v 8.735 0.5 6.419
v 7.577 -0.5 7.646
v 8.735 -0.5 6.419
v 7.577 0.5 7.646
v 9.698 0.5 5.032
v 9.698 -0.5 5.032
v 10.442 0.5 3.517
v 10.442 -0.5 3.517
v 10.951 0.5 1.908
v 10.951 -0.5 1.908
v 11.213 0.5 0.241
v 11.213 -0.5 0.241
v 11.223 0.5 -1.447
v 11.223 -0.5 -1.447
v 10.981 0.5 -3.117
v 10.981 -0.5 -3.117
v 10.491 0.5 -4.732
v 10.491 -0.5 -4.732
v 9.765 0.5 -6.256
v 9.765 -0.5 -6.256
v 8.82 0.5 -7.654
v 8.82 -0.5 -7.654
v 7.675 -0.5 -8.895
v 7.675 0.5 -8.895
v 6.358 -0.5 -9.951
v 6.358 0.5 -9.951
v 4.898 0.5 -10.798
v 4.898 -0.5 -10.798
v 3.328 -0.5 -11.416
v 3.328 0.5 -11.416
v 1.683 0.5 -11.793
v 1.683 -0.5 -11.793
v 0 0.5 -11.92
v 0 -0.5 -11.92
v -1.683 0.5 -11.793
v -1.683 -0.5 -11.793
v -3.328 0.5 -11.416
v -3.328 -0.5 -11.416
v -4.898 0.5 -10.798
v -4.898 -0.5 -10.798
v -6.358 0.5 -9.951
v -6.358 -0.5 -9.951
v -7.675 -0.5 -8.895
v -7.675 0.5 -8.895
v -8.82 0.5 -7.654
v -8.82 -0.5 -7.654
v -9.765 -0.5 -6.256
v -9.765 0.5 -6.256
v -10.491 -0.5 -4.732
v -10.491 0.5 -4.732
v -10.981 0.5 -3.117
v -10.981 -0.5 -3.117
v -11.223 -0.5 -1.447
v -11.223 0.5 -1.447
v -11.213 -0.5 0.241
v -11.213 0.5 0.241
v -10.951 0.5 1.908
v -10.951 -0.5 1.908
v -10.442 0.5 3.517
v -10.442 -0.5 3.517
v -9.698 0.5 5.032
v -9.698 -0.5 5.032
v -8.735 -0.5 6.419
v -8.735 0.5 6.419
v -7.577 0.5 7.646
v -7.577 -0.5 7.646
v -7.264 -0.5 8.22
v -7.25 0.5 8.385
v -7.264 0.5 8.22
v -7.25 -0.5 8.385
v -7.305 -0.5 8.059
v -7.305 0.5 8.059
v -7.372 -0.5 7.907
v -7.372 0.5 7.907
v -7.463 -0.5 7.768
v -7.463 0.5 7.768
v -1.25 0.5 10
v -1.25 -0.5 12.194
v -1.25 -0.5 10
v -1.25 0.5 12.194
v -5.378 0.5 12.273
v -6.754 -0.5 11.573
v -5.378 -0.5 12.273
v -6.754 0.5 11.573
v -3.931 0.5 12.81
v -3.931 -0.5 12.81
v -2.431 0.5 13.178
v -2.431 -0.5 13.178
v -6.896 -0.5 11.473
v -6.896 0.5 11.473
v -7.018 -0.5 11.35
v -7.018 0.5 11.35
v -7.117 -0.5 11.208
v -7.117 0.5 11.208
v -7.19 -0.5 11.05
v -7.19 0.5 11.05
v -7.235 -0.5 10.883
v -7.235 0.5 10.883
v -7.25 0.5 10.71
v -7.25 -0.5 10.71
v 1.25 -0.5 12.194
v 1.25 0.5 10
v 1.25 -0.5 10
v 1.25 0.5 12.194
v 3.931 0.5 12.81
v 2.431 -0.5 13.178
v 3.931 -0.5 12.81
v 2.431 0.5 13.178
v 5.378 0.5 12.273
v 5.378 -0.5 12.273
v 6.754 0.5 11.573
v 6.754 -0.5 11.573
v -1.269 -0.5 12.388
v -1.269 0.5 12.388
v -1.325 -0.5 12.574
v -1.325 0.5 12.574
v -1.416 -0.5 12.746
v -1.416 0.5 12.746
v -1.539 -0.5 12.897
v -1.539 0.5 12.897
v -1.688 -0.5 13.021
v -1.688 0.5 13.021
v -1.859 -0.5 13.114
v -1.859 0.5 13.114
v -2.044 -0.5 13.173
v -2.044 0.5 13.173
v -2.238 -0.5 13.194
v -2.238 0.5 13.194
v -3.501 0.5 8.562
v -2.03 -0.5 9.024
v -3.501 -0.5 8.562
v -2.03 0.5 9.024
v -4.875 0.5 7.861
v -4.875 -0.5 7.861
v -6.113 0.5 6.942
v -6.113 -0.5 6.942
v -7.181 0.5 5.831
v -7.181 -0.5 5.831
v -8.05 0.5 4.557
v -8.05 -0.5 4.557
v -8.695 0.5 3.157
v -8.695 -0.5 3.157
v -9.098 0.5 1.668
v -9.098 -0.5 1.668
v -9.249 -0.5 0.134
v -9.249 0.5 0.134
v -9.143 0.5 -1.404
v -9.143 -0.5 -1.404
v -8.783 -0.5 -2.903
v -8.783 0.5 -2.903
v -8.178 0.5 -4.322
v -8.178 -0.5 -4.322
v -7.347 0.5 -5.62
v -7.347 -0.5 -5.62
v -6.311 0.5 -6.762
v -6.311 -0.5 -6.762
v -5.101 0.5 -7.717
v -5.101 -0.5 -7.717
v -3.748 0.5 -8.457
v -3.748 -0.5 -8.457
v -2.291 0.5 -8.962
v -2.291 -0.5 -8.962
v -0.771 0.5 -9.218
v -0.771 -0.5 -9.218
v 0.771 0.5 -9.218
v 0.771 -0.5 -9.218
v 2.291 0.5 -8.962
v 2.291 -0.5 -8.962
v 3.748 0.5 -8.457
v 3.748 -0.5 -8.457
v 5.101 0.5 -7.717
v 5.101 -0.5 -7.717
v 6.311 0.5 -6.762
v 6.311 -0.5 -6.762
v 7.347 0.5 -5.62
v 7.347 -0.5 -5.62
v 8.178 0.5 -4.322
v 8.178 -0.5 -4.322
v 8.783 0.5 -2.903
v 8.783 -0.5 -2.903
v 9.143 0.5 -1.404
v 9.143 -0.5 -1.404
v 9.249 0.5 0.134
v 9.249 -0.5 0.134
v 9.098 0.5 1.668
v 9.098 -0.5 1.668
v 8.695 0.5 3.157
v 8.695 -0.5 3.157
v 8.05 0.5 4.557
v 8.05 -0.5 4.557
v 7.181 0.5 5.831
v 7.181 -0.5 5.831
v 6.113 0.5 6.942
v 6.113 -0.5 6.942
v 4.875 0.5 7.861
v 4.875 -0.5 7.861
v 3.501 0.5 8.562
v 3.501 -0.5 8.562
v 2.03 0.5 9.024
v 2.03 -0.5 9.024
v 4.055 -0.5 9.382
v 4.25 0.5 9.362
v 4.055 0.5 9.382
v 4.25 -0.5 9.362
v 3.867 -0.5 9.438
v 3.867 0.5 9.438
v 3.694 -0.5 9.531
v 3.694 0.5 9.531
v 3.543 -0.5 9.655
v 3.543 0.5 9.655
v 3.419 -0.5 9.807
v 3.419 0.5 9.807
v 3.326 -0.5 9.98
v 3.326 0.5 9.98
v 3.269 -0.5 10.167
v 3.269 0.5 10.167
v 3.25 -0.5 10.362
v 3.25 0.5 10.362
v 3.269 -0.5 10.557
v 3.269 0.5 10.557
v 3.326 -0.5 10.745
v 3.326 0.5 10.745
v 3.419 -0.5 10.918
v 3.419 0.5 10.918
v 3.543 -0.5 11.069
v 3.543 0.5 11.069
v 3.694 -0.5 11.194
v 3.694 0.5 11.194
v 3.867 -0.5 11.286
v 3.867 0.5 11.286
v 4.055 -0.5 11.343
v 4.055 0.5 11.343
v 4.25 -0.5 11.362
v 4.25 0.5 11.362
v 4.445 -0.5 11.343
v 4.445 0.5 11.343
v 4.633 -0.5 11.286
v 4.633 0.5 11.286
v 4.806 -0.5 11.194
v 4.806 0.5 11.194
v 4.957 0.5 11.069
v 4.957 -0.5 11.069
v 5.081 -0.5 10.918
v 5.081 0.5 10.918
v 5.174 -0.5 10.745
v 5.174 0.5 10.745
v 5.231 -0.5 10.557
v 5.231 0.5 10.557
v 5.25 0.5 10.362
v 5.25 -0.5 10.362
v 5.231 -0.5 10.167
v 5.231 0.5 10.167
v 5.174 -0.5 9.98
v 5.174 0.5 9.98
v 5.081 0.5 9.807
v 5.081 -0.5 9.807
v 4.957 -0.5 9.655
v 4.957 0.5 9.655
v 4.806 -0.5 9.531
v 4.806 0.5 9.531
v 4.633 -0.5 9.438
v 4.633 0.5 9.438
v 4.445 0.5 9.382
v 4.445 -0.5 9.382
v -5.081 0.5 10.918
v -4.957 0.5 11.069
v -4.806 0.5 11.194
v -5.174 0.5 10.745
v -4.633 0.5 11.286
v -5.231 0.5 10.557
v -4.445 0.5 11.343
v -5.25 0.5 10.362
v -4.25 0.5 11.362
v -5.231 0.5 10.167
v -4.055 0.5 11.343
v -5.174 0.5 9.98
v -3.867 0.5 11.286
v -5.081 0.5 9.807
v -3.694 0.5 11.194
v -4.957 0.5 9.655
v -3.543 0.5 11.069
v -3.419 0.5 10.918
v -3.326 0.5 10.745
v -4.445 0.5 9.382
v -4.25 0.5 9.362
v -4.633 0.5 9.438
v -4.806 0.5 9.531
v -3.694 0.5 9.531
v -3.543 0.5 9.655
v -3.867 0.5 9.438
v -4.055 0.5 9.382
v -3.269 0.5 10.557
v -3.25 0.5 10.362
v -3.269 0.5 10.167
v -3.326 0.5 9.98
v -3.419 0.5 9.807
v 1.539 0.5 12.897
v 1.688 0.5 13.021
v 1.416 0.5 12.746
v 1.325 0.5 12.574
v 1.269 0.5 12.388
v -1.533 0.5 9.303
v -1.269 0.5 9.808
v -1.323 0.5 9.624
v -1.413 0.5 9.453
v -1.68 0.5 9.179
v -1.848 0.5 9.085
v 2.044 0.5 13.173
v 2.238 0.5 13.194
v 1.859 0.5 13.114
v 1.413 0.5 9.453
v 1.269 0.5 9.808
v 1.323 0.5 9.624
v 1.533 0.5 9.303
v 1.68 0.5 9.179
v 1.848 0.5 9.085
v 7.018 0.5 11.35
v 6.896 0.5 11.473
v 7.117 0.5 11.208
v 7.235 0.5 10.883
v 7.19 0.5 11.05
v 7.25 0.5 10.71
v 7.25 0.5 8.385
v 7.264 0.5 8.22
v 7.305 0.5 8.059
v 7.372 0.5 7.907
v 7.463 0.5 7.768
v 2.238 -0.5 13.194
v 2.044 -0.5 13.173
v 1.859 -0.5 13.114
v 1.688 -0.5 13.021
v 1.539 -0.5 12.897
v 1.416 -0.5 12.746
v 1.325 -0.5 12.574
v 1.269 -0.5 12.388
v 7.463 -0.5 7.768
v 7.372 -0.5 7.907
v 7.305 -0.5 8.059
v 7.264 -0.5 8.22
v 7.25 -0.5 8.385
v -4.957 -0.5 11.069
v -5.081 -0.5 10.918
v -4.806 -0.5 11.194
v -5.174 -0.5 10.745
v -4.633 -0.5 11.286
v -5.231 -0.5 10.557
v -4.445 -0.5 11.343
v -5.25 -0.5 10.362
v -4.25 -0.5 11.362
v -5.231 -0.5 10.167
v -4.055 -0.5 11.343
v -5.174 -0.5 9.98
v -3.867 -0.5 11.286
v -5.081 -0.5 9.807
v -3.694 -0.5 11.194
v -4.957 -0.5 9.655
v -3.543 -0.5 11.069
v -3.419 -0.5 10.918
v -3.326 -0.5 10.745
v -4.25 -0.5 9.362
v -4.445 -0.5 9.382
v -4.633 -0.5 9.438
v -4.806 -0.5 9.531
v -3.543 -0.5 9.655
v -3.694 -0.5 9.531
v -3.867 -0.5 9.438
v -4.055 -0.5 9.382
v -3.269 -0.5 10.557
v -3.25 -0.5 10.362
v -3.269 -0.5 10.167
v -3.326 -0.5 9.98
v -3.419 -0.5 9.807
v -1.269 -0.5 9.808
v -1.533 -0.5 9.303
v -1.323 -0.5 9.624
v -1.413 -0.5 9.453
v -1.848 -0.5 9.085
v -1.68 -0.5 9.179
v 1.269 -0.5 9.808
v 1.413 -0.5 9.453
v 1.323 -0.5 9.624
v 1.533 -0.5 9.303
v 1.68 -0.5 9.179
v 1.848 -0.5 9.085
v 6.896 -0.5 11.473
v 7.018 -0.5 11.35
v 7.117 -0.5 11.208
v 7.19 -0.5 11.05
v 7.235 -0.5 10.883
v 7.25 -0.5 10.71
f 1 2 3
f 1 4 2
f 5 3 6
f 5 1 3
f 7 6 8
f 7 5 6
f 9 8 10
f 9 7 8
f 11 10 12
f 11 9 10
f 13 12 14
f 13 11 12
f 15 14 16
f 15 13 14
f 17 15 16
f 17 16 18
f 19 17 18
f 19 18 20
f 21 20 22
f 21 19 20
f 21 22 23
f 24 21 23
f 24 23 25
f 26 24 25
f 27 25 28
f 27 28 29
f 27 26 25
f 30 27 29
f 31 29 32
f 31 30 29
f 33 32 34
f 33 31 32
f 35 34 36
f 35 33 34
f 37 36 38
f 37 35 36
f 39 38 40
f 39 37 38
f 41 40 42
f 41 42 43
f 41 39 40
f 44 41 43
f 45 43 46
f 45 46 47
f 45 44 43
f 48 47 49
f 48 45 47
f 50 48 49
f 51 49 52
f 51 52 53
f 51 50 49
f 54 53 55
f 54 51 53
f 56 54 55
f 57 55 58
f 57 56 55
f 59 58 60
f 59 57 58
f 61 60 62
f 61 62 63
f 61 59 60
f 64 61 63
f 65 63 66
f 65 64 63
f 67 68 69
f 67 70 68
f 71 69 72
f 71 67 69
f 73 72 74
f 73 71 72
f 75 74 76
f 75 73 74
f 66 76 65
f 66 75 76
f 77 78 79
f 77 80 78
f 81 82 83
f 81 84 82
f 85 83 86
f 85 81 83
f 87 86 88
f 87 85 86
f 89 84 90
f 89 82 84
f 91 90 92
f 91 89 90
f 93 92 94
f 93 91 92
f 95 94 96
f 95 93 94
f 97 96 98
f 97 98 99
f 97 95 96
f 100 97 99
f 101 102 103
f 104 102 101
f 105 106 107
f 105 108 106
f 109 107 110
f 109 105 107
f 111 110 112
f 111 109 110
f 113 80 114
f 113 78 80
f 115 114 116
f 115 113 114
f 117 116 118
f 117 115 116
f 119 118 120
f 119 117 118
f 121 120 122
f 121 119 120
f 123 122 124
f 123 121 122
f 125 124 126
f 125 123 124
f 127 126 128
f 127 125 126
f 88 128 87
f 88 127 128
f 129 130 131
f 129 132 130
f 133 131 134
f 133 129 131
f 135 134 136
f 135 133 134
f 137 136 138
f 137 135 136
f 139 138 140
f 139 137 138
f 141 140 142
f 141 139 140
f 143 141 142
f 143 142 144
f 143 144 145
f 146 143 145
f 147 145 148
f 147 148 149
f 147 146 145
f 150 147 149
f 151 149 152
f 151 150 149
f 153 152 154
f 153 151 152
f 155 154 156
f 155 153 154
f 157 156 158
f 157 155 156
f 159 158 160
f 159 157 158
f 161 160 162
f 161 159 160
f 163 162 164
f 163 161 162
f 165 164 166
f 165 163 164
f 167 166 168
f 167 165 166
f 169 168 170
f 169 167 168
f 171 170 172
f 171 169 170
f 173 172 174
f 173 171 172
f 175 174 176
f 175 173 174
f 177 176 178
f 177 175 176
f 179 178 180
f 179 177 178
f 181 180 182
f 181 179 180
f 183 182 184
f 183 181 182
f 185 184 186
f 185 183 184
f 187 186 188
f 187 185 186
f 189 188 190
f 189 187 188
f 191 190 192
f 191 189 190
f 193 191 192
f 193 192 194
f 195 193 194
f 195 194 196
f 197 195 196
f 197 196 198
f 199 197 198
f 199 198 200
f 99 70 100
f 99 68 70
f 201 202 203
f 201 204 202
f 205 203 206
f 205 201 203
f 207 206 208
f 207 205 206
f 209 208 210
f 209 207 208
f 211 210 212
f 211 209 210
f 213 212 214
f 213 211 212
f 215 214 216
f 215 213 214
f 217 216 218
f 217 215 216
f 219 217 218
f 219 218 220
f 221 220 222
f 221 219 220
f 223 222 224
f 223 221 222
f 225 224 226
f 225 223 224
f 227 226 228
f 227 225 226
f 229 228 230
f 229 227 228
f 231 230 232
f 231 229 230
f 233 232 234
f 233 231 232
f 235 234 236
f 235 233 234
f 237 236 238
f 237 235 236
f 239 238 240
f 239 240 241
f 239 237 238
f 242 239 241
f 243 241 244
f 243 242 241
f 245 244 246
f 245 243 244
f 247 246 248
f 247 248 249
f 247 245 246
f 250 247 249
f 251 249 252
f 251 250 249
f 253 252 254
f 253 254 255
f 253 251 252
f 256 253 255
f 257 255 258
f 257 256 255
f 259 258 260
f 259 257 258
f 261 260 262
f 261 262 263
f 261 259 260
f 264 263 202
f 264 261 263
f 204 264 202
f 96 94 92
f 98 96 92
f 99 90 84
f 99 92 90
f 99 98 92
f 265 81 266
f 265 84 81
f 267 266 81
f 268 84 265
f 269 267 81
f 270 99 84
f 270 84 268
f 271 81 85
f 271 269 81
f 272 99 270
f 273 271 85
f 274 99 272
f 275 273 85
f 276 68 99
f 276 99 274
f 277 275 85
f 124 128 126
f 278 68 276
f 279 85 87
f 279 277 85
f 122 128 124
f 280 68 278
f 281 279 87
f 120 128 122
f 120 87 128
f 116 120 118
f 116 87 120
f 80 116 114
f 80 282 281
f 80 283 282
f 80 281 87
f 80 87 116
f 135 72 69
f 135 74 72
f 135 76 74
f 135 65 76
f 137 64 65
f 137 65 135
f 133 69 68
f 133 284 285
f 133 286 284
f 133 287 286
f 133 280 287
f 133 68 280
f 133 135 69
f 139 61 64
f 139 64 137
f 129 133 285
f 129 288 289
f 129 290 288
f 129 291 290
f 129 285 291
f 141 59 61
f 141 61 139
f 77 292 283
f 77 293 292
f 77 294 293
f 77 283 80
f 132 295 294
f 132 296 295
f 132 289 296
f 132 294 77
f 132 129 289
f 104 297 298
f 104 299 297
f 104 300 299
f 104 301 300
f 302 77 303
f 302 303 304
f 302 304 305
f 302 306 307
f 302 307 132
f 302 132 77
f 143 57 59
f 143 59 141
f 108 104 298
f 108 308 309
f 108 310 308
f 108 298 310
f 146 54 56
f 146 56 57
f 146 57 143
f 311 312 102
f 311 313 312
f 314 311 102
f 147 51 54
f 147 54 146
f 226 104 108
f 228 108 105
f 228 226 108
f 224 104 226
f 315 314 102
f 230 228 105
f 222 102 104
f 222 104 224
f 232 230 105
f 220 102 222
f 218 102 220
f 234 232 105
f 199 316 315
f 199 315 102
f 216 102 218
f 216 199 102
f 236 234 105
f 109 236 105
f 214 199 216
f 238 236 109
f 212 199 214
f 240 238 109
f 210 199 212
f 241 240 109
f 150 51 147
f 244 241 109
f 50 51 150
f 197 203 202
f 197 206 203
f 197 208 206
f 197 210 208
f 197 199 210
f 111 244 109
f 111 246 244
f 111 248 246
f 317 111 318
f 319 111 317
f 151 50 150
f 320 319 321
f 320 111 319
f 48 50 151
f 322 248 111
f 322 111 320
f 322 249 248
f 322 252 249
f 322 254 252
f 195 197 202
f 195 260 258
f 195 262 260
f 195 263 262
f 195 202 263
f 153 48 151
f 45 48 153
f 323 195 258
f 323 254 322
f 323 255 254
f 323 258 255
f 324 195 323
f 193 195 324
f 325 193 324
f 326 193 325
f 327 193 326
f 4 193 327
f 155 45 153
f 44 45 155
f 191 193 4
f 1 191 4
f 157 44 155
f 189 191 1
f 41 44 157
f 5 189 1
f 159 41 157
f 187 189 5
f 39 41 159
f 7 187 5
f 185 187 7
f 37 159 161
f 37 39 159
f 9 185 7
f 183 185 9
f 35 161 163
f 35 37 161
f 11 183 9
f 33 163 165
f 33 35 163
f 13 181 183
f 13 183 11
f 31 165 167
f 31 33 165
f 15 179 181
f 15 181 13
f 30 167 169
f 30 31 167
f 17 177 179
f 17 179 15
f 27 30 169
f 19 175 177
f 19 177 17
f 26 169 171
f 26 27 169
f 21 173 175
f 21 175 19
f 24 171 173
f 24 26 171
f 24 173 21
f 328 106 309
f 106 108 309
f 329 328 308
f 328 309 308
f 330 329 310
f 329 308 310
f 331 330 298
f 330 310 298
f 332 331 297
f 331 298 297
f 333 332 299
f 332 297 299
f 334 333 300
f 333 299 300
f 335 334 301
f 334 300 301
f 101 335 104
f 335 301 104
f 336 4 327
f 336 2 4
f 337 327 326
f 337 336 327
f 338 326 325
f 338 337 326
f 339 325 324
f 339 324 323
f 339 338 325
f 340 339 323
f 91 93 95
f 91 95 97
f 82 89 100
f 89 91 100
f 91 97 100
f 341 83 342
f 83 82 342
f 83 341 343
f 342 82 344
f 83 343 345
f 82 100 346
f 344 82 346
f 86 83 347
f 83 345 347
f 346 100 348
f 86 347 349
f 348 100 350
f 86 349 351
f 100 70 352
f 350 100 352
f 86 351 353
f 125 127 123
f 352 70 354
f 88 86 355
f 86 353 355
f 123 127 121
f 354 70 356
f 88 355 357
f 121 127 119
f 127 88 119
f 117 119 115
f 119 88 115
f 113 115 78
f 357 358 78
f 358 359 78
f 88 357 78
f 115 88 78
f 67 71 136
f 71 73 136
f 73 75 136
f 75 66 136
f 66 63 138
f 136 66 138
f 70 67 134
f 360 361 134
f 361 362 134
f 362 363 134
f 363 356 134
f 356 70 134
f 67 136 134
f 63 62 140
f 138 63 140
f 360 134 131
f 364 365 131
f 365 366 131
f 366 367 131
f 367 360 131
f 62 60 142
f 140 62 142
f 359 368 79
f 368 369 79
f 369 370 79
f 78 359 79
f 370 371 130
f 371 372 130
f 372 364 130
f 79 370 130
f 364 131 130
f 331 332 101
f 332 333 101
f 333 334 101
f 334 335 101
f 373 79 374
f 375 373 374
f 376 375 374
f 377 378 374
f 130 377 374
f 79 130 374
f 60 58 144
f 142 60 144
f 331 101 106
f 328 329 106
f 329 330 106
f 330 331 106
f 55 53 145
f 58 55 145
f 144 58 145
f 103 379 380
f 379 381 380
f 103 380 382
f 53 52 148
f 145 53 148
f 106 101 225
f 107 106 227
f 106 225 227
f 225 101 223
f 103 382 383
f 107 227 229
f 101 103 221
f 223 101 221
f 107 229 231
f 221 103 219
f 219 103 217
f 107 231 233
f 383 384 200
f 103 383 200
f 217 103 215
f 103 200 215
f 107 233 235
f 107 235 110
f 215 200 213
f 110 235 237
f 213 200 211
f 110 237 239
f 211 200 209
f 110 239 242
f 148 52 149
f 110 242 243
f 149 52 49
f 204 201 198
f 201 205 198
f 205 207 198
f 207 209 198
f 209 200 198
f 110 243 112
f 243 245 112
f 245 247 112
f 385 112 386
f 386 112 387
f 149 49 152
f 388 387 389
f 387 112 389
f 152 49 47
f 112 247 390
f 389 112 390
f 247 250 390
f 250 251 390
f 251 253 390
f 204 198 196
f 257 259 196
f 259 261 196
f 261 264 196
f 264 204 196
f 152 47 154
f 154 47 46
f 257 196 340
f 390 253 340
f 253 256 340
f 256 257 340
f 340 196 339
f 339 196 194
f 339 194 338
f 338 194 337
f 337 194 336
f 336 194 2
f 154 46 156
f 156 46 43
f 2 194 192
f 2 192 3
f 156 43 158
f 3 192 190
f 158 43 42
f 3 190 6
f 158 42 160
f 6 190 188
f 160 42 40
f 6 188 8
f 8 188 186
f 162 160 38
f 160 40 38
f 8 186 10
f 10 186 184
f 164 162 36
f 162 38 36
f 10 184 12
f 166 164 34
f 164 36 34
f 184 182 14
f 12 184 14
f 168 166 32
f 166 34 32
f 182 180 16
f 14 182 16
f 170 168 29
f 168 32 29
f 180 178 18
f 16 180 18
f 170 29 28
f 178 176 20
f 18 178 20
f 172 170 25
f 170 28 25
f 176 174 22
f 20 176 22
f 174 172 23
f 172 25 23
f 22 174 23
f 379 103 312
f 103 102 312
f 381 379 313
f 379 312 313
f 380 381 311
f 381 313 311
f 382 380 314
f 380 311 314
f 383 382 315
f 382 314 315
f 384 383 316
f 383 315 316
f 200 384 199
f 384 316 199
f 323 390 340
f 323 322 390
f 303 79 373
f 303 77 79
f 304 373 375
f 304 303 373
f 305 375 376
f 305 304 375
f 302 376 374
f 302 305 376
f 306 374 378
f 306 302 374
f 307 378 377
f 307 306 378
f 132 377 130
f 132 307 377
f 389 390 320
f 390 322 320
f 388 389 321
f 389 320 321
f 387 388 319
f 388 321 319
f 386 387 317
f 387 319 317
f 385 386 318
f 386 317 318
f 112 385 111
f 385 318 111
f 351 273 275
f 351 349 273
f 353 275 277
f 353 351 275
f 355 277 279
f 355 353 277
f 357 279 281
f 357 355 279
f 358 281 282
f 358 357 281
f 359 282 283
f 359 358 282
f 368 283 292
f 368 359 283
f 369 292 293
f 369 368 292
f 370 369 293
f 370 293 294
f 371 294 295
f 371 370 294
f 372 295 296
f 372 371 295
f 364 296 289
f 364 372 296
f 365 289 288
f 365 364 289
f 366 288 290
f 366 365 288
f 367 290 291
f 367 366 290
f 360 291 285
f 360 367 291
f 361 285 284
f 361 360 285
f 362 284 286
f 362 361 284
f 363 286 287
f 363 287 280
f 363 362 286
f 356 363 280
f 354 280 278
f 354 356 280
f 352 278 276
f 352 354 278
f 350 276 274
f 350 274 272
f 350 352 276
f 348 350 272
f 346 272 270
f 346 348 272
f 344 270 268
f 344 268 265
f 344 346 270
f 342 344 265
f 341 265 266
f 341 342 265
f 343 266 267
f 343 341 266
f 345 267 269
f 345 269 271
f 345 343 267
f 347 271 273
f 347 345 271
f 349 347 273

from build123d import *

# Parameters (mm, degrees)
SKETCH_1_R      = 1
EXTRUDE_1_DEPTH = 0.5
FILLET_1_R      = 1


with BuildPart() as part:
    # 草图1 → 凸台-拉伸1 (new, symmetric)
    with BuildSketch(Plane(origin=(0, 0, 0), x_dir=(1, 0, 0), z_dir=(0, 1, 0))):
        with BuildLine():
            Line((-1.25, -13.341570372), (-1.25, -9.16515139))
            ThreePointArc((-1.25, -9.16515139), (0, 9.25), (1.25, -9.16515139))
            Line((1.25, -9.16515139), (1.25, -13.341570372))
            ThreePointArc((1.25, -13.341570372), (4.374478114, -12.665857303), (7.25, -11.269316749))
            Line((7.25, -11.269316749), (7.25, -7.932325267))
            ThreePointArc((7.25, -7.932325267), (0, 11.92), (-7.25, -7.932325267))
            Line((-7.25, -7.932325267), (-7.25, -11.269316749))
            ThreePointArc((-7.25, -11.269316749), (-4.374478114, -12.665857303), (-1.25, -13.341570372))
        make_face()
        with Locations(Location((-4.25, -10.362311518, 0), (0, 0, 270))):
            Circle(SKETCH_1_R, mode=Mode.SUBTRACT)
        with Locations(Location((4.25, -10.362311518, 0), (0, 0, 90))):
            Circle(SKETCH_1_R, mode=Mode.SUBTRACT)
    extrude(amount=EXTRUDE_1_DEPTH, both=True)

    # 圆角1
    fillet_1_edges = [part.edges().sort_by_distance(p)[0] for p in [
        (7.25, 0, 7.932325267),
        (7.25, 0, 11.269316749),
        (1.25, 0, 13.341570372),
        (1.25, 0, 9.16515139),
        (-1.25, 0, 9.16515139),
        (-1.25, 0, 13.341570372),
        (-7.25, 0, 11.269316749),
        (-7.25, 0, 7.932325267),
    ]]
    fillet(fillet_1_edges, radius=FILLET_1_R)


solid = part.part
